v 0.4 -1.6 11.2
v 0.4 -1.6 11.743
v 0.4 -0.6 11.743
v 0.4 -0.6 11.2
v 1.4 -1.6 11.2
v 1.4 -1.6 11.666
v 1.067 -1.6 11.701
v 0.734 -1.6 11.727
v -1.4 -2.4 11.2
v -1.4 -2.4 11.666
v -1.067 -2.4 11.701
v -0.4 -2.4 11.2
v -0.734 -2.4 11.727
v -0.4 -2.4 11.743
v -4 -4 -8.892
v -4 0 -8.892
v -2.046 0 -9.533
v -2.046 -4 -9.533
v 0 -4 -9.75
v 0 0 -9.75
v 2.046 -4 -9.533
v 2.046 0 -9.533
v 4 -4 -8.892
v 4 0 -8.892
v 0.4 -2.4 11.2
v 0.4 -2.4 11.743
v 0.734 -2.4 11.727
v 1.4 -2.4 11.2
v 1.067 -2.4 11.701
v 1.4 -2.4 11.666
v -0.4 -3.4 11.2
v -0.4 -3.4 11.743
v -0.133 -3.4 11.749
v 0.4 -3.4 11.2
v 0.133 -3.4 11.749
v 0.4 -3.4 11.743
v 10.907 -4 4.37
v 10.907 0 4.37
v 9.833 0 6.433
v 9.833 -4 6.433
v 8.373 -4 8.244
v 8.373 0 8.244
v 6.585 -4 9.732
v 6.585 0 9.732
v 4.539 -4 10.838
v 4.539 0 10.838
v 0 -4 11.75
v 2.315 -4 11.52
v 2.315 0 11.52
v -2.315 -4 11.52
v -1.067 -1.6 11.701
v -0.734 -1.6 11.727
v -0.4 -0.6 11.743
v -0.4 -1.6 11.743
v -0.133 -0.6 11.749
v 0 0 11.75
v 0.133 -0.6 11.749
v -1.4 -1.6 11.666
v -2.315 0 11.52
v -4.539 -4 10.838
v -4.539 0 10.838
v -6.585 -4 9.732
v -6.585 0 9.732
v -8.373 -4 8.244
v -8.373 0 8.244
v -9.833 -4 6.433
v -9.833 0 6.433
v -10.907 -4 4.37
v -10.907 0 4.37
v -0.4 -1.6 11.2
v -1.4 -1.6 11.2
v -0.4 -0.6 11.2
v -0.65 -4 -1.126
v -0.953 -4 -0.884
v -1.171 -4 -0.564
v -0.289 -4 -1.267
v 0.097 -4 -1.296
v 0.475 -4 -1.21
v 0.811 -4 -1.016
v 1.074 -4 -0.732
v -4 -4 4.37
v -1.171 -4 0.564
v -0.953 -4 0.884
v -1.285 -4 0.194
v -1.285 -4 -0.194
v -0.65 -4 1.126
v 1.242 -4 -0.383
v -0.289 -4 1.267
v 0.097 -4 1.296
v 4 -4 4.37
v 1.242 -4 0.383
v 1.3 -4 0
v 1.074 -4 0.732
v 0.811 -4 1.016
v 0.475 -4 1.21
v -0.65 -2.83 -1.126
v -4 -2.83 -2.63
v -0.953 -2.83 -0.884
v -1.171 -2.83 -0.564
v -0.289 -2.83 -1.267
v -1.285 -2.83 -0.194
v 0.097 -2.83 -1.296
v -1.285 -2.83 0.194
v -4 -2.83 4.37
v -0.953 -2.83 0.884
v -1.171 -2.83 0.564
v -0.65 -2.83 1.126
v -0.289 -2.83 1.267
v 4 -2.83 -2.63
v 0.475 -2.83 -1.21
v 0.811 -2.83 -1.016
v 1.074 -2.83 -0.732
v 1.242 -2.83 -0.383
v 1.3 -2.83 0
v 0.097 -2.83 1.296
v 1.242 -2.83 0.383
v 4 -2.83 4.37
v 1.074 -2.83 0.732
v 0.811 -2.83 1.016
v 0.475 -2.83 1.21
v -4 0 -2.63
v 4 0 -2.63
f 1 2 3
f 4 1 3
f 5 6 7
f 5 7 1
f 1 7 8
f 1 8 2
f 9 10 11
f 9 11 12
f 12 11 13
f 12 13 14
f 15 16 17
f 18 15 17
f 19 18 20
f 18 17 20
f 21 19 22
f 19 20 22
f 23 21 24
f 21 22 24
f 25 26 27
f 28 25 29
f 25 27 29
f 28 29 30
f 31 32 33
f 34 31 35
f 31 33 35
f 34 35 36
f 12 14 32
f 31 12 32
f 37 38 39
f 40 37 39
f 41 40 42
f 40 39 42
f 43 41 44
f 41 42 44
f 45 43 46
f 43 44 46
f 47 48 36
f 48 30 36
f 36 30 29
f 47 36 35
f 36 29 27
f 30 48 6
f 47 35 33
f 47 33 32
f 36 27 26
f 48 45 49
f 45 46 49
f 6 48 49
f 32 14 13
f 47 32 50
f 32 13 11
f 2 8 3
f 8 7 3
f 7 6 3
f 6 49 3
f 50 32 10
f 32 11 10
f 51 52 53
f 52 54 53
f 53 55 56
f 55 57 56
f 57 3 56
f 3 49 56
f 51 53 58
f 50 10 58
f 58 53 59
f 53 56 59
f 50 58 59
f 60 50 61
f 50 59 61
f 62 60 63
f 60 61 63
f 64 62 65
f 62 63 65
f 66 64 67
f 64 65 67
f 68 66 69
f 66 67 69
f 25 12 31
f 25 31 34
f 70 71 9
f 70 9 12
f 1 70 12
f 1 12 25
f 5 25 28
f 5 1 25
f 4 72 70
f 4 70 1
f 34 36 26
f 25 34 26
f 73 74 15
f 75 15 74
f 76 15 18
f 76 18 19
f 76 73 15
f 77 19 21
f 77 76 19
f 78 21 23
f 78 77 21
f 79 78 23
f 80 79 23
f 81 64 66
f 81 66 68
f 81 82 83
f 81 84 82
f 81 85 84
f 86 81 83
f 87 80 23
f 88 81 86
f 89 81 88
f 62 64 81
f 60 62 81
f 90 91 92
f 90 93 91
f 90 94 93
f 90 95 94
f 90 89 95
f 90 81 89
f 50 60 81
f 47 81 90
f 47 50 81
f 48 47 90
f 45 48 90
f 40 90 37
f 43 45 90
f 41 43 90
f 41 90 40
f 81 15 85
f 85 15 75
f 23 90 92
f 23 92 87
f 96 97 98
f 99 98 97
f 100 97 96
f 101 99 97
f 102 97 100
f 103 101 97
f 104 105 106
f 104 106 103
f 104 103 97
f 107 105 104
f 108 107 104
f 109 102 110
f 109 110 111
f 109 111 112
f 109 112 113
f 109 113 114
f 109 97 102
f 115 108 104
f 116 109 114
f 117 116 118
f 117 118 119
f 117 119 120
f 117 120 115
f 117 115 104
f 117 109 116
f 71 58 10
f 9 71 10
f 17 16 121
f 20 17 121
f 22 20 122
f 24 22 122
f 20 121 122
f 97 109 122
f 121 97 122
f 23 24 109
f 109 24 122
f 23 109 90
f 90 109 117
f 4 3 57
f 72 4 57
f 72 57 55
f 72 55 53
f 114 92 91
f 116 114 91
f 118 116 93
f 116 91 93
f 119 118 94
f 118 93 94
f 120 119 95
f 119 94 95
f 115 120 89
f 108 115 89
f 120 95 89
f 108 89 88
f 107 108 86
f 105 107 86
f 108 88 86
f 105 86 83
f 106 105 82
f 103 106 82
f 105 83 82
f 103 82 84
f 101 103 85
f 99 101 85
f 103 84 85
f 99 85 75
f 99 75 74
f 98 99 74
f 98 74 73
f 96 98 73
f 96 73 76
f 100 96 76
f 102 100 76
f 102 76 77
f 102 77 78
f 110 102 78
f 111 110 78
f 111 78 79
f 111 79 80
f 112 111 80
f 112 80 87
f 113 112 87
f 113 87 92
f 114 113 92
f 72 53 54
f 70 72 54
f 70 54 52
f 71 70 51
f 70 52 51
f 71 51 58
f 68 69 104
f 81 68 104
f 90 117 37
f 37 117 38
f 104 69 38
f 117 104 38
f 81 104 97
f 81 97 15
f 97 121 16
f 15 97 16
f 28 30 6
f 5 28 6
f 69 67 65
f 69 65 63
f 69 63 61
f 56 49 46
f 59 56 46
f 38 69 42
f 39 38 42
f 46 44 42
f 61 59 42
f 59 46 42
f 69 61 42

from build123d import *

# Parameters (mm, degrees)
F1_DEPTH = 4
F2_W     = 2.83
F2_H     = 7
F3_DEPTH = 12.5
F6_DEPTH = 0.8
F7_R     = 1.3
F8_DEPTH = 4.001


with BuildPart() as f1:
    # F0 (on Front) → F1 (new body)
    with BuildSketch(Plane.XZ):
        with BuildLine():
            Line((-4, 4.37), (-4, -8.89171))
            ThreePointArc((-4, -8.89171), (0, -9.75), (4, -8.89171))
            Line((4, -8.89171), (4, 4.37))
            Line((4, 4.37), (10.907135, 4.37))
            ThreePointArc((10.907135, 4.37), (0, 11.75), (-10.907135, 4.37))
            Line((-10.907135, 4.37), (-4, 4.37))
        make_face()
    extrude(amount=F1_DEPTH)

    # F2 (on Right) → F3 (cut, symmetric)
    with BuildSketch(Plane.YZ):
        with Locations((-1.415, 0.87)):
            Rectangle(F2_W, F2_H)
    extrude(amount=F3_DEPTH, both=True, mode=Mode.SUBTRACT)

    # F5 (on offset) → F6 (cut)
    with BuildSketch(Plane.XY.offset(12)):
        Polygon((-0.4, -1.6), (-1.4, -1.6), (-1.4, -2.4), (-0.4, -2.4), (-0.4, -3.4), (0.4, -3.4), (0.4, -2.4), (1.4, -2.4), (1.4, -1.6), (0.4, -1.6), (0.4, -0.6), (-0.4, -0.6), align=None)
    extrude(amount=-F6_DEPTH, mode=Mode.SUBTRACT)

    # F7 (on face) → F8 (cut, through all)
    with BuildSketch(Plane.XZ.offset(4)):
        Circle(F7_R)
    extrude(amount=-F8_DEPTH, mode=Mode.SUBTRACT)


solid = f1.part
